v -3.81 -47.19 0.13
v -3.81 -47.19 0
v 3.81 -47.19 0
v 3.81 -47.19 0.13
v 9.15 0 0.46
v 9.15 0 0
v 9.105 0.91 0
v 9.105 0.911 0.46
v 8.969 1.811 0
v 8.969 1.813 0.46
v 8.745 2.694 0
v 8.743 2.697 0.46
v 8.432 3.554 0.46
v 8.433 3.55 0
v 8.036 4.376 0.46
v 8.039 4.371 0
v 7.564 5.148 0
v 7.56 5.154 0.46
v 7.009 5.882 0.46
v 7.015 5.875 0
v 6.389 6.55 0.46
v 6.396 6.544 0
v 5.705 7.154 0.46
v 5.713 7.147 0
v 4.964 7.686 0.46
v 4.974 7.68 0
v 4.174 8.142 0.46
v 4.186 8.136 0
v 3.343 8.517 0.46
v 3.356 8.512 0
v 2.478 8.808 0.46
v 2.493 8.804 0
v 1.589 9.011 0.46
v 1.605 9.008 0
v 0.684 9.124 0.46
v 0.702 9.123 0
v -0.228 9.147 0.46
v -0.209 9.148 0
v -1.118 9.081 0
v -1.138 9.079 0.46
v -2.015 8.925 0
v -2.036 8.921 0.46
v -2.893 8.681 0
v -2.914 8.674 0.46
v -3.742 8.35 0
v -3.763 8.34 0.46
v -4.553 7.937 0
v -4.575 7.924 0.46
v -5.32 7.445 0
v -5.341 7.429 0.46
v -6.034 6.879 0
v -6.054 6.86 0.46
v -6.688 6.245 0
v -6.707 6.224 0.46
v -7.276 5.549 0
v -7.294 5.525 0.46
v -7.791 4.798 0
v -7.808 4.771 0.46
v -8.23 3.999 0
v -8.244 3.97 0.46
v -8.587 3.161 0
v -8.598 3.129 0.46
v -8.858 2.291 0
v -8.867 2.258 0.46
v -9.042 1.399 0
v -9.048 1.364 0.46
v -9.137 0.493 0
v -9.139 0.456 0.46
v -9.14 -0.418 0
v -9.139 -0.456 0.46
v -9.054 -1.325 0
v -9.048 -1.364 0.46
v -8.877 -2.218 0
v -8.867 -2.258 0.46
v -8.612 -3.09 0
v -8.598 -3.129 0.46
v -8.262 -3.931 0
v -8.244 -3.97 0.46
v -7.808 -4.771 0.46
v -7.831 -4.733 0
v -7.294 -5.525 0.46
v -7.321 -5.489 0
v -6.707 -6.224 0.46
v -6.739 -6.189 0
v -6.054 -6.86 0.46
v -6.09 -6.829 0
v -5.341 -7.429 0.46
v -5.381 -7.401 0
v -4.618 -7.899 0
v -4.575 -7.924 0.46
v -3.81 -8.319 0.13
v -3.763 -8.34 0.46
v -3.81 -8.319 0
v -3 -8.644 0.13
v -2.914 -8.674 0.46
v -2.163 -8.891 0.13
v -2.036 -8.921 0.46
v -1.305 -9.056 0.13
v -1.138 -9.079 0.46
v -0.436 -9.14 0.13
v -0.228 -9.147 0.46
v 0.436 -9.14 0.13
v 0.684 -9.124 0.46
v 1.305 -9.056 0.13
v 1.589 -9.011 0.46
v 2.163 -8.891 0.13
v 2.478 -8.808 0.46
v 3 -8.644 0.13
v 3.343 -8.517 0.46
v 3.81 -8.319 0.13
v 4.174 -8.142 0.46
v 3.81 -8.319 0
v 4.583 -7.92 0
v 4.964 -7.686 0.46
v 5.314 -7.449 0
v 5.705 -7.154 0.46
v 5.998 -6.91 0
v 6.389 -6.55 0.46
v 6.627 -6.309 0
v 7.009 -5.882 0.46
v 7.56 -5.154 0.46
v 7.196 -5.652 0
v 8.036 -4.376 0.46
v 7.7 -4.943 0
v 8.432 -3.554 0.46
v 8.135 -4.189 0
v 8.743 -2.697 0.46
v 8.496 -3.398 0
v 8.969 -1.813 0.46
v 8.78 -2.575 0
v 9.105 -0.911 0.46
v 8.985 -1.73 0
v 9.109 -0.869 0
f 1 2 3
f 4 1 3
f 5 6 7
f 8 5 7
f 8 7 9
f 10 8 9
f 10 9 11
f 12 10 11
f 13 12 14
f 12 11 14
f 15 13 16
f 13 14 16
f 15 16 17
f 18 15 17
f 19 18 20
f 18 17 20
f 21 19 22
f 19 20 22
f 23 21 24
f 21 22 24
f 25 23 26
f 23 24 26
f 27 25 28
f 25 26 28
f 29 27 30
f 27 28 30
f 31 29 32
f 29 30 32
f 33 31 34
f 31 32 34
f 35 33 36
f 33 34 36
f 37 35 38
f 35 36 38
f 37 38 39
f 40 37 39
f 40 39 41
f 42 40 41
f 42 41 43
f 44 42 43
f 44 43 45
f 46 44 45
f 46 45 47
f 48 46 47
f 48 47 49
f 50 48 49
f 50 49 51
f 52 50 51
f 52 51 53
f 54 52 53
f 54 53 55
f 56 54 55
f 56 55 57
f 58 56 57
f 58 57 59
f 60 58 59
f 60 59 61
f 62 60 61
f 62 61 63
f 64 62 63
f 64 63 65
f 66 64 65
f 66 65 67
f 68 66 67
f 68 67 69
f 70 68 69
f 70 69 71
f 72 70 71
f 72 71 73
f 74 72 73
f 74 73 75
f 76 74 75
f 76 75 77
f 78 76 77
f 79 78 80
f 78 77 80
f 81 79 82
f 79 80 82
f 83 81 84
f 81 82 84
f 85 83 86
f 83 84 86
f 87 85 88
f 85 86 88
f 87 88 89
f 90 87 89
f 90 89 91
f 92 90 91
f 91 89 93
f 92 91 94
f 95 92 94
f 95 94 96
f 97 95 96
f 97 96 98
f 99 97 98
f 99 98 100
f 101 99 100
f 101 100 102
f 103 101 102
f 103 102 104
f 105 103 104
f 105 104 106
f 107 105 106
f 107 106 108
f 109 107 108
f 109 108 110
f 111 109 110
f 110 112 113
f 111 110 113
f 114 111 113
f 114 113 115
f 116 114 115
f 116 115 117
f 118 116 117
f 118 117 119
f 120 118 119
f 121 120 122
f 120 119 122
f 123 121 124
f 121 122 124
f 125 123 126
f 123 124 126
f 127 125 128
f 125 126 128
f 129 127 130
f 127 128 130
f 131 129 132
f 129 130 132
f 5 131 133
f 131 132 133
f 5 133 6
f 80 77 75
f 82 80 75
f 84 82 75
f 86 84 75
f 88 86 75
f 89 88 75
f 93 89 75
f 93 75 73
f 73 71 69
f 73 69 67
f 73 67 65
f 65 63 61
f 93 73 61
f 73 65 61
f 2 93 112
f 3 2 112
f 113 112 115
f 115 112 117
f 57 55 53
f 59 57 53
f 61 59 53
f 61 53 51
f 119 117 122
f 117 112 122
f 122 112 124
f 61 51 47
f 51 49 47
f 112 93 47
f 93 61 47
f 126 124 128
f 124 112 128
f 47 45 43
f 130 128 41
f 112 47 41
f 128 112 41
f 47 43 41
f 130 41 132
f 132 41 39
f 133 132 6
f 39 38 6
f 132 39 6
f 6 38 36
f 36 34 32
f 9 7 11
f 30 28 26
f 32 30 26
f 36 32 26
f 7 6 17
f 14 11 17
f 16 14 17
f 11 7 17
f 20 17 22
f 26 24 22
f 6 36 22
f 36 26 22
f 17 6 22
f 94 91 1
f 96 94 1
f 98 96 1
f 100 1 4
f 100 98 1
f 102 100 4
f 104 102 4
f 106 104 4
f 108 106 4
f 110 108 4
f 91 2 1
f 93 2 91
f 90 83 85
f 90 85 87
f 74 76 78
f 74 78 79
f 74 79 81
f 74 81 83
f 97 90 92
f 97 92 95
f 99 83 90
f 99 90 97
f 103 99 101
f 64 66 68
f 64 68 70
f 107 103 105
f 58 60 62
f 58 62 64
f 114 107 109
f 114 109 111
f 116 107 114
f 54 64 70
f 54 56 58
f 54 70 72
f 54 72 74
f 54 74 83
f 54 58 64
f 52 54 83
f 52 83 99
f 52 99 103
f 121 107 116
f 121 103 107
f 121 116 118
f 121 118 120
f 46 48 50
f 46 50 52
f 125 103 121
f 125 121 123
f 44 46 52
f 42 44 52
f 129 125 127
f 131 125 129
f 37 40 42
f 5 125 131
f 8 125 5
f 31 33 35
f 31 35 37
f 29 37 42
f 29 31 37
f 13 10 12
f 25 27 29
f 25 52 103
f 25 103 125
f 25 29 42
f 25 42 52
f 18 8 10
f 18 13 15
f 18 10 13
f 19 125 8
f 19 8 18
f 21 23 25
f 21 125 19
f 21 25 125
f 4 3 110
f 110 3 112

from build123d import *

# Parameters (mm, degrees)
SKETCH1_R           = 9.15
BOSS_EXTRUDE1_DEPTH = 0.46
SKETCH2_W           = 7.62
SKETCH2_H           = 38.870961594
BOSS_EXTRUDE2_DEPTH = 0.13


with BuildPart() as part:
    # Sketch1 → Boss-Extrude1 (new body)
    with BuildSketch(Plane.XY):
        Circle(SKETCH1_R)
    extrude(amount=BOSS_EXTRUDE1_DEPTH)

    # Sketch2 → Boss-Extrude2 (add)
    with BuildSketch(Plane.XY):
        with Locations((0, -27.754519203)):
            Rectangle(SKETCH2_W, SKETCH2_H)
    extrude(amount=BOSS_EXTRUDE2_DEPTH)


solid = part.part
